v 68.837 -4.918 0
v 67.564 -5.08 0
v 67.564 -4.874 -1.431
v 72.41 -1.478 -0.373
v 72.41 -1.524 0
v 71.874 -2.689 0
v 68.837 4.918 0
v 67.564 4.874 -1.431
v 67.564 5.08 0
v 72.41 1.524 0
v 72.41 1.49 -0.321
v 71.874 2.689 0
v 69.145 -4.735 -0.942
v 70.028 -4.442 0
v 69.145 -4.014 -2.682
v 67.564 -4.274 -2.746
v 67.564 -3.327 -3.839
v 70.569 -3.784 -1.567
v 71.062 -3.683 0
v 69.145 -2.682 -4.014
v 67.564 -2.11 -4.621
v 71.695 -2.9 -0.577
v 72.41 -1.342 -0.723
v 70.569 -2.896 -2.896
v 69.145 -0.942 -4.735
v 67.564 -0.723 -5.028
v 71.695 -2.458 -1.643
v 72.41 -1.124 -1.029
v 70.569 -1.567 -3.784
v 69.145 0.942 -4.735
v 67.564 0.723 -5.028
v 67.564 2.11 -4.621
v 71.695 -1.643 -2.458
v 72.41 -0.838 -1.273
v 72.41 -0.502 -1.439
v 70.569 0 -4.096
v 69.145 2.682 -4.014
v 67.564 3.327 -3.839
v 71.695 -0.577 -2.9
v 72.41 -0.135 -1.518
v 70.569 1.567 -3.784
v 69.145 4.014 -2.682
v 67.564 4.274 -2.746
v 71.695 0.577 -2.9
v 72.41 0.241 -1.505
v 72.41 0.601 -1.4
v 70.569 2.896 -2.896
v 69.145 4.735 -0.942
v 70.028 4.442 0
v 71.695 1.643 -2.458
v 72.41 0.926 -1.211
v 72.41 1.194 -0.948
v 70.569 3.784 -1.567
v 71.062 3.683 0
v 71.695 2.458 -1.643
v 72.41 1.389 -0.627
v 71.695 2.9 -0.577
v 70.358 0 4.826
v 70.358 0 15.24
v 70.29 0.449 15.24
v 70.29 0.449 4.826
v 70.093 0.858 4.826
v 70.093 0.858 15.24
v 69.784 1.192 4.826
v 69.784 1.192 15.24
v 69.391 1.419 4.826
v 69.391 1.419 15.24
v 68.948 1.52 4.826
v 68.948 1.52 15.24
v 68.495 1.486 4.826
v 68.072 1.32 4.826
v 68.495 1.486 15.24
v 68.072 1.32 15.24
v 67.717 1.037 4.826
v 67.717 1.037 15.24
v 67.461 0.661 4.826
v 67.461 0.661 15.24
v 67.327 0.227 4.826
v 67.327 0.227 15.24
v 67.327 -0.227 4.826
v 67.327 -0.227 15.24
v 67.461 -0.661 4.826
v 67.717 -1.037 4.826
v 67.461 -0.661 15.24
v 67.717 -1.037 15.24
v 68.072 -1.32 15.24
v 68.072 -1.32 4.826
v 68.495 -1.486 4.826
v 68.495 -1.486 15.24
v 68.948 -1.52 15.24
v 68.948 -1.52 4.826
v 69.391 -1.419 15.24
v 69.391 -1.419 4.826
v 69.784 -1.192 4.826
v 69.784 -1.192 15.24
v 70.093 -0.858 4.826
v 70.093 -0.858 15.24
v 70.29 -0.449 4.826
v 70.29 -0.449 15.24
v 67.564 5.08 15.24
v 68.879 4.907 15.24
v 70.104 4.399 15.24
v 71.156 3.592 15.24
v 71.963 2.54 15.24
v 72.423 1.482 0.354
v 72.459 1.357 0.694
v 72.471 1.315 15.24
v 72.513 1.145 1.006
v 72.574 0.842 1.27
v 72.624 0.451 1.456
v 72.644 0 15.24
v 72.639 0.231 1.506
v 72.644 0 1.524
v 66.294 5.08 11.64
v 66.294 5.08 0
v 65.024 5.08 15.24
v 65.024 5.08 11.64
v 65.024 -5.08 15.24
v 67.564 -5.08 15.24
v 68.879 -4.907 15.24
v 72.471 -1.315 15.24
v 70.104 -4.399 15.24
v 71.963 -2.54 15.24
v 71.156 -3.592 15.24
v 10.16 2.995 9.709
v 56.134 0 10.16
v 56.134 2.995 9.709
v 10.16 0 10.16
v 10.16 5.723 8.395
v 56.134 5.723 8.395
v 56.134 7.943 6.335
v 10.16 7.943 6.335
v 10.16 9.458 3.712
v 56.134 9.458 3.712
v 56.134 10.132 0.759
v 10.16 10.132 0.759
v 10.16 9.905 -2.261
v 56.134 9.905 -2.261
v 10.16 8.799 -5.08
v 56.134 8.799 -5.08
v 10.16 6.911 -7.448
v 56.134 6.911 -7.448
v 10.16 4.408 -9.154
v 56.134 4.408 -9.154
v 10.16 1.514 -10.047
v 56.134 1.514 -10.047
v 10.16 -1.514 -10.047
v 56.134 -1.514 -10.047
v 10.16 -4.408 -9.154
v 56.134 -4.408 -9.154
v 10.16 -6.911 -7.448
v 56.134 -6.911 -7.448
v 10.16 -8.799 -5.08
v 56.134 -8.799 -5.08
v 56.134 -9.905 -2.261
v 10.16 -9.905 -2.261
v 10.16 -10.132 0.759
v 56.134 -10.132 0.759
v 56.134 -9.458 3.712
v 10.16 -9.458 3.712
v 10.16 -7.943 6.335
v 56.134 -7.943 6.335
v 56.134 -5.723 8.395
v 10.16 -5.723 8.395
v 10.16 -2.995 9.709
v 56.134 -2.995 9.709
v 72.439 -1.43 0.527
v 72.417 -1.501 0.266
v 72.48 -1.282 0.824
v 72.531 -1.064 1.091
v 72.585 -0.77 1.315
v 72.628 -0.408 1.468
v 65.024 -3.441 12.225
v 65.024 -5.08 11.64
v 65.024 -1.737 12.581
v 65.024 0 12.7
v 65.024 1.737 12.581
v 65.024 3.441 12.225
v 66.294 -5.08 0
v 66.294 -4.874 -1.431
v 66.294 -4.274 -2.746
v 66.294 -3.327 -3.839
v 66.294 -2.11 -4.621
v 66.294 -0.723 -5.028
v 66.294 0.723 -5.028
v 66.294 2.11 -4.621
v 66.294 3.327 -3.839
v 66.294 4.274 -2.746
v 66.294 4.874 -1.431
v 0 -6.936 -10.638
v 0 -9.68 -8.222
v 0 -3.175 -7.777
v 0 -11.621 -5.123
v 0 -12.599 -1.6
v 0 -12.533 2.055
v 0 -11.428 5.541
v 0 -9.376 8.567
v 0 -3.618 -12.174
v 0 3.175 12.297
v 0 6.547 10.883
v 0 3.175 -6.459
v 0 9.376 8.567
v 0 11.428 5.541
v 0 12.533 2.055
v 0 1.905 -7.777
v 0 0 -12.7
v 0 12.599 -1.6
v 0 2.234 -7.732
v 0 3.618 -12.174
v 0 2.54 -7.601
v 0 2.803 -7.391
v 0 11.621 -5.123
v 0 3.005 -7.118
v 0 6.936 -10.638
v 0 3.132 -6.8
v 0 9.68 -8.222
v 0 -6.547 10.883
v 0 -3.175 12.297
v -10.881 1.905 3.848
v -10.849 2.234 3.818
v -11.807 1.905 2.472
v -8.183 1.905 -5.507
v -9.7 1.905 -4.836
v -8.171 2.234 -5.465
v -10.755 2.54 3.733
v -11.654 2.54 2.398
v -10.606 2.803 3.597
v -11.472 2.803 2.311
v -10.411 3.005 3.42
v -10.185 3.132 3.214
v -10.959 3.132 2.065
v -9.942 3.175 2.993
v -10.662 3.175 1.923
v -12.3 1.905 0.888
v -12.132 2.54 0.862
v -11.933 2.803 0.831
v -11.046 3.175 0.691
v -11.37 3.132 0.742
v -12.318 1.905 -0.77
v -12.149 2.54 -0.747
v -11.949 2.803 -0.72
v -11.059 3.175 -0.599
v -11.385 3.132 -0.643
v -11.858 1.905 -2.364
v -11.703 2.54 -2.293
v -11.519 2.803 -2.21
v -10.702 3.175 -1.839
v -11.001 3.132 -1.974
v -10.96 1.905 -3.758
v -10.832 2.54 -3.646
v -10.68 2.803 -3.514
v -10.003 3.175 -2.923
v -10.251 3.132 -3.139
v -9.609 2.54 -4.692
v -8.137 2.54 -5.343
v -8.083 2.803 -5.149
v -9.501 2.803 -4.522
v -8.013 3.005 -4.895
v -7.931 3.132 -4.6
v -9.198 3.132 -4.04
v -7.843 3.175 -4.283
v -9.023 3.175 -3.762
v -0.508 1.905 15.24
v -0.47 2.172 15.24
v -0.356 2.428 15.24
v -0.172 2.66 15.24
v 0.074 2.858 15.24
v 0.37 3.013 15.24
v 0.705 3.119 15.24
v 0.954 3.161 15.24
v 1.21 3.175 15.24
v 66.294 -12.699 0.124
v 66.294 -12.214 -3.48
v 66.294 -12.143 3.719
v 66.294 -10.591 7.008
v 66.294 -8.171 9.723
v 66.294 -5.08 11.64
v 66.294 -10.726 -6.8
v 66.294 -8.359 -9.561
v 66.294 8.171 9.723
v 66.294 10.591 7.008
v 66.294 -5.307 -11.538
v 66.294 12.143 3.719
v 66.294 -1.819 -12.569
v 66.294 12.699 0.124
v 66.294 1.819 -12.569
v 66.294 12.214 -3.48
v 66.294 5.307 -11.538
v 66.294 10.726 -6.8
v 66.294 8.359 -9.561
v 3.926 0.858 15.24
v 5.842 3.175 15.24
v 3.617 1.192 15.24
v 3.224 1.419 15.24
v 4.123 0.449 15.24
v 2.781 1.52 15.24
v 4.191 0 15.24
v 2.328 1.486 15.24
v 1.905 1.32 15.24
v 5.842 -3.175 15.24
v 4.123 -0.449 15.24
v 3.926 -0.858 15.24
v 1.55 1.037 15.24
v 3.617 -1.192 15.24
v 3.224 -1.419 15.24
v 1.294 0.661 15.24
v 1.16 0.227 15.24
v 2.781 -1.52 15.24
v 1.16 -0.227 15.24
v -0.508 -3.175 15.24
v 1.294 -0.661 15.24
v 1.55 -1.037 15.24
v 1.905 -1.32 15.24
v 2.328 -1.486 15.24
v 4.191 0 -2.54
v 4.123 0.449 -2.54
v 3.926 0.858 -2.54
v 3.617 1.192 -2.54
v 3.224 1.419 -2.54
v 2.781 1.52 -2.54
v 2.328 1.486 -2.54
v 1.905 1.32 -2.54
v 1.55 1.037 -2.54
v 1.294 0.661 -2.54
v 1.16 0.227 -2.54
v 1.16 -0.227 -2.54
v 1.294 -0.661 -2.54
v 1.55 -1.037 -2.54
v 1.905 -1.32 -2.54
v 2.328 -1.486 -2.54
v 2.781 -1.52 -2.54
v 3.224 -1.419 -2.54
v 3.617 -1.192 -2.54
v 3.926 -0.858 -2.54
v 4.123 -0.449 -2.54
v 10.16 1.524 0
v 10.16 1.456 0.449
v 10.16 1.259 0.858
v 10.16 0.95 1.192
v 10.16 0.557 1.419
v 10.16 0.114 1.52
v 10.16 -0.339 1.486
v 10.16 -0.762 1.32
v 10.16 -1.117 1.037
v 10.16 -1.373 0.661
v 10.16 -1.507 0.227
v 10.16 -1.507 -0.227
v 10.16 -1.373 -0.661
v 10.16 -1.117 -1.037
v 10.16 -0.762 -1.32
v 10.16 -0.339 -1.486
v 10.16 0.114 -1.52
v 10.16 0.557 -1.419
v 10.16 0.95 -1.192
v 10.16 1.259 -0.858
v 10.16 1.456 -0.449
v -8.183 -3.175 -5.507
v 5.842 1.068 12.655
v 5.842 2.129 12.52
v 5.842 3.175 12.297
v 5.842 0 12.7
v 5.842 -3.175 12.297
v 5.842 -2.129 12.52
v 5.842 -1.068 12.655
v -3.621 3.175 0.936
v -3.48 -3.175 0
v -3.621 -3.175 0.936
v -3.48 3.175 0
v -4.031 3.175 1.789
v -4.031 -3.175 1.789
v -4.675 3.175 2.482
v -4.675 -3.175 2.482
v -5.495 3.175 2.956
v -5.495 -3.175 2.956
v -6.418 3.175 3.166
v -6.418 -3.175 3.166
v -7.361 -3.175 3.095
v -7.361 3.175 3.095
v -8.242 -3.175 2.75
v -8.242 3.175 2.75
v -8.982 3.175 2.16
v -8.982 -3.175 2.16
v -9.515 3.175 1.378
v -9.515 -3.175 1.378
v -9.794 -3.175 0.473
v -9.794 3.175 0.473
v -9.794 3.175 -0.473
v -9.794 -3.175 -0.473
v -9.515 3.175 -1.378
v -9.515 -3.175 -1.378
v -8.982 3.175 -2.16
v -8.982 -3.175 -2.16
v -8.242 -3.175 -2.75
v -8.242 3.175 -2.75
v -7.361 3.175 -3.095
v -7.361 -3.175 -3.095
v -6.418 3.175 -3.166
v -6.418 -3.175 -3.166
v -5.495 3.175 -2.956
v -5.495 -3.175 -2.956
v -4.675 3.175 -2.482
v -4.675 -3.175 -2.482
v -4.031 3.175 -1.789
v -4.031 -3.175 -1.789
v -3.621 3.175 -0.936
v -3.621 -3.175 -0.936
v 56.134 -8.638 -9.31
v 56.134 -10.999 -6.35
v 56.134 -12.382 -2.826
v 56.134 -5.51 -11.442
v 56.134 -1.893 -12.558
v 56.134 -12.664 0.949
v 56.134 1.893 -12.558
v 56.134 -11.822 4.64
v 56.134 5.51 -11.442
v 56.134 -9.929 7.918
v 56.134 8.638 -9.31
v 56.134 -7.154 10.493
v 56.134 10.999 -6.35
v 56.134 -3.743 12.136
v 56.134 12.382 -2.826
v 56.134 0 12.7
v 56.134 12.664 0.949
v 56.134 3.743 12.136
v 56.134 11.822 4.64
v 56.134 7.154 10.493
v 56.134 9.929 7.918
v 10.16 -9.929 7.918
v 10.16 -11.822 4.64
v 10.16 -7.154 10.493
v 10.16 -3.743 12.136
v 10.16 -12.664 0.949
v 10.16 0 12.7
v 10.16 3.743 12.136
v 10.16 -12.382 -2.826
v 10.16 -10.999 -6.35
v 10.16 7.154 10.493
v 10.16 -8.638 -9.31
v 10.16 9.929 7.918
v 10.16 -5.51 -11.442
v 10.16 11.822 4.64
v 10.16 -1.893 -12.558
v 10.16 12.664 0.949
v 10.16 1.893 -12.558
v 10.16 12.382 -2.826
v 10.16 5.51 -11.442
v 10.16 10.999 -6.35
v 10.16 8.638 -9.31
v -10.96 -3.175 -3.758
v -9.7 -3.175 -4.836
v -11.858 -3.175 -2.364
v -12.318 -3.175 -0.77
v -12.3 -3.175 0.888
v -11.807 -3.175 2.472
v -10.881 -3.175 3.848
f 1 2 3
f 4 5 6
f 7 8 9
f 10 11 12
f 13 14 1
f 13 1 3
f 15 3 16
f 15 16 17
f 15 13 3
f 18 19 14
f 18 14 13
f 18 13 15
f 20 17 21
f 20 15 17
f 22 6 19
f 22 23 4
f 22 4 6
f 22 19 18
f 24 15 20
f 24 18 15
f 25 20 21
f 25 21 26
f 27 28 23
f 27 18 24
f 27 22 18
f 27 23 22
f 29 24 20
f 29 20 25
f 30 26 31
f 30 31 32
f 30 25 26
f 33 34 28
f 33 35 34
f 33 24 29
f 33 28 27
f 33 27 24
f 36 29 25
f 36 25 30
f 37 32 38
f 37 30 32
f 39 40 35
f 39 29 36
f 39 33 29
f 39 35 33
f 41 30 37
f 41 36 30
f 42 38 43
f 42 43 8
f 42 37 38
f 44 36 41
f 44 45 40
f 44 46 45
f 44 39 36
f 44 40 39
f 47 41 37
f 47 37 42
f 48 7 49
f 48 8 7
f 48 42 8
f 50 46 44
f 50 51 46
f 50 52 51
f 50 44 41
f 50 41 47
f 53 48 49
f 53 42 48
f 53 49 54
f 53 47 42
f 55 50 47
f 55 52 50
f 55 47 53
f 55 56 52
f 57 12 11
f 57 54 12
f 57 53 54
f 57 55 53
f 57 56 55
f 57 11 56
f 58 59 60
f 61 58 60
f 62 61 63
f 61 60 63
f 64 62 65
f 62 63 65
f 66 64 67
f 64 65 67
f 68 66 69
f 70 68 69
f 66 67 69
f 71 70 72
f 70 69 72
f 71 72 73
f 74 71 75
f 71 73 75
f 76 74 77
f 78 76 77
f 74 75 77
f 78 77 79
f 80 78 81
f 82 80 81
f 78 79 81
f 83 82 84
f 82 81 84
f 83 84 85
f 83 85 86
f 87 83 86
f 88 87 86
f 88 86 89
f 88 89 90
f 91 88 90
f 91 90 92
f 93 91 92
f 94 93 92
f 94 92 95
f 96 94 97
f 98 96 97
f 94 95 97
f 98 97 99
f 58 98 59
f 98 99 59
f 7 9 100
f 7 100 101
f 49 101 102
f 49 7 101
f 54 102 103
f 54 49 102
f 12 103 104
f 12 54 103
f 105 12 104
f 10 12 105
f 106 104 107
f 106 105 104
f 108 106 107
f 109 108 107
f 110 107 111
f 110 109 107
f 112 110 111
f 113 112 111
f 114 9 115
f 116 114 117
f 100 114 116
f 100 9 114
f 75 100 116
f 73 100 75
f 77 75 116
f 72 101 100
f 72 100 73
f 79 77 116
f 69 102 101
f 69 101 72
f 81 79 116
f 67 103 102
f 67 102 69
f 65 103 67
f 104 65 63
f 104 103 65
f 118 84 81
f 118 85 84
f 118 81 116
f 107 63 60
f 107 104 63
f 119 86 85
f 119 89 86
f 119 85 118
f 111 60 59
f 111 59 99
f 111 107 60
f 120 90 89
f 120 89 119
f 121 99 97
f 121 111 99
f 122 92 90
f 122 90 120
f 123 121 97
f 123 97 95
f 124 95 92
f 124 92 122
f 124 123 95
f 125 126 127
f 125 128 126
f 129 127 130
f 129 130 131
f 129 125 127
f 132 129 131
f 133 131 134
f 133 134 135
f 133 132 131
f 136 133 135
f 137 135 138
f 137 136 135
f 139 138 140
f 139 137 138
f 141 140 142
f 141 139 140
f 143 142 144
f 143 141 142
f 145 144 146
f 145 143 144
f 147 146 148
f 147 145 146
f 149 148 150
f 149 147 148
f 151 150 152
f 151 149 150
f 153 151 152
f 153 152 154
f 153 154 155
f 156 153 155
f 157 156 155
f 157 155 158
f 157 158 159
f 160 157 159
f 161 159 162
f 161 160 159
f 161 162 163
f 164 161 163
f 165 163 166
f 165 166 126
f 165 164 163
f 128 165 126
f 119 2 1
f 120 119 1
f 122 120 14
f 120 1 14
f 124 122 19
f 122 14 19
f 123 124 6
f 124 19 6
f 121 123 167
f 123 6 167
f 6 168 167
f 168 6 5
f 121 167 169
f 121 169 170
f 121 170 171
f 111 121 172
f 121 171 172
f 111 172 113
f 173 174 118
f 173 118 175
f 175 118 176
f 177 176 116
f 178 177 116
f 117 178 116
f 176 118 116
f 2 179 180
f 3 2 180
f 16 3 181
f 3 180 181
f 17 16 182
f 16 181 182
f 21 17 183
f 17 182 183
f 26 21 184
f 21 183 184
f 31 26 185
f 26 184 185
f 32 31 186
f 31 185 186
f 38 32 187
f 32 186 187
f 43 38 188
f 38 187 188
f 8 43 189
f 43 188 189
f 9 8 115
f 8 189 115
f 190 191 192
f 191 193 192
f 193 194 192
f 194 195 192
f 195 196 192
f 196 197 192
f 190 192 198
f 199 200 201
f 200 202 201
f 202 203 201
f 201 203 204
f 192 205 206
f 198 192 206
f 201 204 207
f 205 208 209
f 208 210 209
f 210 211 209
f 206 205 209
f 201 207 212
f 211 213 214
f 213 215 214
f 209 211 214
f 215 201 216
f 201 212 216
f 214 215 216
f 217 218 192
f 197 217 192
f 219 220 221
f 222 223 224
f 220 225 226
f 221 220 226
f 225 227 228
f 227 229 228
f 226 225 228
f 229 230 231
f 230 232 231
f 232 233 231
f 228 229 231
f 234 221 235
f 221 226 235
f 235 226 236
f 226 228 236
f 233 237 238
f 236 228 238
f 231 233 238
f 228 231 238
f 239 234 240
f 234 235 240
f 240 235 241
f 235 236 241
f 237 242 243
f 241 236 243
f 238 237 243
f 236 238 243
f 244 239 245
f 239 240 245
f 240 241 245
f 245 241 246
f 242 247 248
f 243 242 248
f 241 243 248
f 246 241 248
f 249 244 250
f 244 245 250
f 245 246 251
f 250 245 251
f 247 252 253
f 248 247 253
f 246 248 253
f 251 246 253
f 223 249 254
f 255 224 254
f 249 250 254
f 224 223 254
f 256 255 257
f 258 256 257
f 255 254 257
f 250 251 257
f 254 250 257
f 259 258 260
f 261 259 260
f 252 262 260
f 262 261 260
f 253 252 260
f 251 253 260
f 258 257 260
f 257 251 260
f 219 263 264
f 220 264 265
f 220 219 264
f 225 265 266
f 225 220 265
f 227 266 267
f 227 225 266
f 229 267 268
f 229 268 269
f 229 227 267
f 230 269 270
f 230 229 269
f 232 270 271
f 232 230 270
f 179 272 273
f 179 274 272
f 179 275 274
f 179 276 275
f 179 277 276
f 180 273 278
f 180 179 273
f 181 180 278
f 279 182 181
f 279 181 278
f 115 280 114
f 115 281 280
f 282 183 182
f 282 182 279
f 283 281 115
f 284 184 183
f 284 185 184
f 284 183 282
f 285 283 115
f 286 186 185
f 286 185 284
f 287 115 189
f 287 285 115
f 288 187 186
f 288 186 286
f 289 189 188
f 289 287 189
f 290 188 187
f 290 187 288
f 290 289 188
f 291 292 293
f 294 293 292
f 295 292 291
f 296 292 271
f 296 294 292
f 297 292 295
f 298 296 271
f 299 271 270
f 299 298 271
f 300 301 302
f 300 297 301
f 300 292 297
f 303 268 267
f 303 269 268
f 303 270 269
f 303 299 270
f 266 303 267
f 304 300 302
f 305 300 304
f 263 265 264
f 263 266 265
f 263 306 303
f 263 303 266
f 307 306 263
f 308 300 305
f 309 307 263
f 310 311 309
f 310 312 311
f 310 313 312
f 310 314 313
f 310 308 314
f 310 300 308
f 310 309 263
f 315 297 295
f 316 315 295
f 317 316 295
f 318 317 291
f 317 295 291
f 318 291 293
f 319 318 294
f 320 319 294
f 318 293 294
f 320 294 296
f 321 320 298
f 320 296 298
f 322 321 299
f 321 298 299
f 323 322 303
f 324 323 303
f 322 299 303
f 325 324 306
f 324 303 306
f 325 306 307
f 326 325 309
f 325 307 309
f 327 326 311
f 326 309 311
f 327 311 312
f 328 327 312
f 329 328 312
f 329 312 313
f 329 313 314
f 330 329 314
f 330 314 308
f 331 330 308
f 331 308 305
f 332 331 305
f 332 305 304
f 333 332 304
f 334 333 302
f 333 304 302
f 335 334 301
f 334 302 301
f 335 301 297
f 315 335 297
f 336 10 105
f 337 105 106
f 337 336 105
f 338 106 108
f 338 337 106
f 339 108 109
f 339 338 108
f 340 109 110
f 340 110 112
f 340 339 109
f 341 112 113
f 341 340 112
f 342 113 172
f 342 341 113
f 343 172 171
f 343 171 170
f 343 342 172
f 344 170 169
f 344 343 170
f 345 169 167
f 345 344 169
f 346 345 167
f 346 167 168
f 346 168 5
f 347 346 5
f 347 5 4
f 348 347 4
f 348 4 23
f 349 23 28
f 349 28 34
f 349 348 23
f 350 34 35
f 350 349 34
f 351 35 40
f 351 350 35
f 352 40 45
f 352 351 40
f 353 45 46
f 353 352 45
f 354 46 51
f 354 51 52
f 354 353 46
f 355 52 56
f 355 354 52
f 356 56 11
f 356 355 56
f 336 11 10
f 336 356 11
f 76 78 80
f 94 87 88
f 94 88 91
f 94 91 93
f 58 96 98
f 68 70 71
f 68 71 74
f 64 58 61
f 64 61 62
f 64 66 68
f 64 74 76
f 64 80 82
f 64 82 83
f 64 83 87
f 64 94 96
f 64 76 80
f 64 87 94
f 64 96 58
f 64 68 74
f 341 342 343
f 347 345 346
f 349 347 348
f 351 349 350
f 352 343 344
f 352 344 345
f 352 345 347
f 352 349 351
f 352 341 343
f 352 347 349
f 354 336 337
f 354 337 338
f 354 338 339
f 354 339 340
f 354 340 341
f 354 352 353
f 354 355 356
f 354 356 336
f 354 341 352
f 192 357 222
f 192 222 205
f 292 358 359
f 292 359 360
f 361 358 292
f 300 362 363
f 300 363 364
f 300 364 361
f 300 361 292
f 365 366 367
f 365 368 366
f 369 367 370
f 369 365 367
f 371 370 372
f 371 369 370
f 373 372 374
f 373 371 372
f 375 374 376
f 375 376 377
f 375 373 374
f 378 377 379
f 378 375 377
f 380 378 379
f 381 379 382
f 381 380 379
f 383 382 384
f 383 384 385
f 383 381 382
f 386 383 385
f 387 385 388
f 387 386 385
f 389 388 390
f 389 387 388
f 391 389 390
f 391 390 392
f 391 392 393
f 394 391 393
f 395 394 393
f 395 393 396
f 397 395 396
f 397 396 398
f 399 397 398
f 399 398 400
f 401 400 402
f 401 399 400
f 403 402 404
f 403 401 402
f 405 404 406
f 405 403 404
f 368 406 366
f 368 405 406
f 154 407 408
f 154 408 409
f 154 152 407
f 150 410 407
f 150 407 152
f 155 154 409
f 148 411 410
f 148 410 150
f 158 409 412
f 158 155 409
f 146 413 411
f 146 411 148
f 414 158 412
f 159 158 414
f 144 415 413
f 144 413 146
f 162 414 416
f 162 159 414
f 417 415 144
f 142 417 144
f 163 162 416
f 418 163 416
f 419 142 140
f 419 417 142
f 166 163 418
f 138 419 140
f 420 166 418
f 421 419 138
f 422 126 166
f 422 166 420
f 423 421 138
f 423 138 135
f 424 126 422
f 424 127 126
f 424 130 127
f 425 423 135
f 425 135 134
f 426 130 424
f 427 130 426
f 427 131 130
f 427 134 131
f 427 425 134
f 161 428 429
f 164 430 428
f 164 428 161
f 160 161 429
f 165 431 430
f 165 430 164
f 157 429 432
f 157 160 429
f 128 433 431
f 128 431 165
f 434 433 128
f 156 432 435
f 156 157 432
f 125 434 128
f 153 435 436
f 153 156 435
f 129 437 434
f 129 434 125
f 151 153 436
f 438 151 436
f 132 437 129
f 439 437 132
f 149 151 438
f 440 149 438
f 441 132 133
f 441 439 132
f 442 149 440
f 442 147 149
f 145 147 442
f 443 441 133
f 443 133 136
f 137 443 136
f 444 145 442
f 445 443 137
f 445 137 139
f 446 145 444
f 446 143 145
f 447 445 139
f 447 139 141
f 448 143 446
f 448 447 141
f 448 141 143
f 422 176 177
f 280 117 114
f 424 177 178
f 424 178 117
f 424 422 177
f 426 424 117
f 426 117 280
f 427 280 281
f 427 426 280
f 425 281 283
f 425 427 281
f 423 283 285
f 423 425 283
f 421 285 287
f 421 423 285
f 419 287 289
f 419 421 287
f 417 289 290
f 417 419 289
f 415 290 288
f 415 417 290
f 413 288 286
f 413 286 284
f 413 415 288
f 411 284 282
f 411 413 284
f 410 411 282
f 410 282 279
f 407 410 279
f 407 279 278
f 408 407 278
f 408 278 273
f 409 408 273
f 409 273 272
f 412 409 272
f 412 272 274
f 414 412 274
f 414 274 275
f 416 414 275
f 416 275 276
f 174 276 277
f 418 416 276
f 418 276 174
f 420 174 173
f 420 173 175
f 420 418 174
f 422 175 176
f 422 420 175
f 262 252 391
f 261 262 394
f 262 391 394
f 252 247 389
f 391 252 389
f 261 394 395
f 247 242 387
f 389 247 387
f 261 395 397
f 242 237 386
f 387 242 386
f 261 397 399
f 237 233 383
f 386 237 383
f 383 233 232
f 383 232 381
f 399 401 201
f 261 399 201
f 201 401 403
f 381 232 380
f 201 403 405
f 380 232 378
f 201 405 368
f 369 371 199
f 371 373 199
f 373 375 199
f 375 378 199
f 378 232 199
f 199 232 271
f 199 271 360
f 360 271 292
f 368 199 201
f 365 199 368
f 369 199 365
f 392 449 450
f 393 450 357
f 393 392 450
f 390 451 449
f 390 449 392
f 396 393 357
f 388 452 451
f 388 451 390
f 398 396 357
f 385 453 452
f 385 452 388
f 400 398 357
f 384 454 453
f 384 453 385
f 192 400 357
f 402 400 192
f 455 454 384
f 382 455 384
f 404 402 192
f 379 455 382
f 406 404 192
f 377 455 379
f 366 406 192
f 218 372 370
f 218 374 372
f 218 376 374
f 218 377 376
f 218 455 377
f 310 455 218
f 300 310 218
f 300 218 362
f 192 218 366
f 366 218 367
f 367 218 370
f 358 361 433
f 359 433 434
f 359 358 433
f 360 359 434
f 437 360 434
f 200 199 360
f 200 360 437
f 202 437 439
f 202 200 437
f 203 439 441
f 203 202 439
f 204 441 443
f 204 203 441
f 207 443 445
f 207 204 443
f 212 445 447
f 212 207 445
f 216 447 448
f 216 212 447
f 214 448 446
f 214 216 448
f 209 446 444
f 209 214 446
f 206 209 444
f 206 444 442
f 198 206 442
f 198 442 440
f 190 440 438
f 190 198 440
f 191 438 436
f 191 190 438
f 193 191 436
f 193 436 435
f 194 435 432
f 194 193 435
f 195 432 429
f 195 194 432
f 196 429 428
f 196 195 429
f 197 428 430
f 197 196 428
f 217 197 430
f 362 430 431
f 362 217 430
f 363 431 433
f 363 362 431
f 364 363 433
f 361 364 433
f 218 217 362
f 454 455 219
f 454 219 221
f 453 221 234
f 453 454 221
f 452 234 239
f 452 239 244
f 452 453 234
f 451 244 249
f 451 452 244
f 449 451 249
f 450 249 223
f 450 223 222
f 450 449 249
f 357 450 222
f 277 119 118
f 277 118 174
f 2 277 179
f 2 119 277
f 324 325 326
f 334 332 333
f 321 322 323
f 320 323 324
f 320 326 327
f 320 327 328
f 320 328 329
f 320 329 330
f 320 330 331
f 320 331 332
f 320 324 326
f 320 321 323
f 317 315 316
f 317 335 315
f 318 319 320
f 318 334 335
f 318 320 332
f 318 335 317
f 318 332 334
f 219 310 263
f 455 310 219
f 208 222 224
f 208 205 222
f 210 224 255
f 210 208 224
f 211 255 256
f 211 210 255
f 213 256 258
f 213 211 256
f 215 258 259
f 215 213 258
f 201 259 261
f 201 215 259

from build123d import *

# Parameters (mm, degrees)
F0_W          = 5.842
F0_H          = 12.7
F0_R          = 3.175
F2_DEPTH      = 3.175
F3_R          = 1.524
F4_DEPTH      = 6.35
F4_DEPTH_BACK = 1.27
F5_R          = 1.524
F6_DEPTH      = 10.414
F7_R          = 1.524
F8_DEPTH      = 17.78
F9_DEPTH      = 56.134
F10_R         = 1.27
F11_T1_DEPTH  = 27.94
F11_T4_ANGLE  = 180


# Not quite as in the source:
# - a fillet or chamfer that OpenCascade refuses, or shapes differently, is made with other operations: its cross-section is extruded or revolved along the edge and cut away or added


with BuildPart() as f1:
    # F0 (on Front) → F1 (revolve)
    with BuildSketch(Plane.XZ):
        Polygon((5.842, 12.7), (5.842, 0), (66.294, 0), (66.294, 12.7), (56.134, 12.7), (56.134, 10.16), (10.16, 10.16), (10.16, 12.7), align=None)
        with Locations((2.921, 6.35)):
            Rectangle(F0_W, F0_H)
    revolve(axis=Axis((33.147, 0, 0), (-1, 0, 0)))

    # F0 (on Front) → F2 (join, symmetric)
    with BuildSketch(Plane.XZ):
        with BuildLine():
            Line((-0.9398, 0), (0, 0))
            Line((0, 0), (0, 12.7))
            Line((0, 12.7), (5.842, 12.7))
            Line((5.842, 12.7), (5.842, 15.24))
            Line((5.842, 15.24), (-0.508, 15.24))
            Line((-0.508, 15.24), (-10.8806298187, 3.8475430269))
            ThreePointArc((-10.8806298187, 3.8475430269), (-4.5919612295, 5.3297205562), (-0.9398, 0))
        make_face()
        with Locations((2.921, 6.35)):
            Rectangle(F0_W, F0_H)
        with BuildLine():
            Line((5.842, 0), (0, 0))
            Line((0, 0), (-0.9398, 0))
            ThreePointArc((-0.9398, 0), (-3.1957909266, -4.5493385486), (-8.1826630726, -5.5069827884))
            Line((-8.1826630726, -5.5069827884), (5.842, -9.398))
            Line((5.842, -9.398), (5.842, 0))
        make_face()
        with BuildLine():
            ThreePointArc((-8.1826630726, -5.5069827884), (-3.1957909266, -4.5493385486), (-0.9398, 0))
            ThreePointArc((-0.9398, 0), (-4.5919612295, 5.3297205562), (-10.8806298187, 3.8475430269))
            ThreePointArc((-10.8806298187, 3.8475430269), (-12.1459778134, -1.5837270034), (-8.1826630726, -5.5069827884))
        make_face()
        with Locations((-6.6548, 0)):
            Circle(F0_R, mode=Mode.SUBTRACT)
    extrude(amount=F2_DEPTH, both=True)

    # F3 (on face) → F4 (join, two sides)
    with BuildSketch(Plane.YZ.offset(66.294)) as f4_sk:
        with BuildLine():
            ThreePointArc((-5.08, 0), (0, -5.08), (5.08, 0))
            ThreePointArc((5.08, 0), (0, 5.08), (-5.08, 0))
        make_face()
        Circle(F3_R, mode=Mode.SUBTRACT)
        with BuildLine():
            ThreePointArc((-5.08, 0), (0, 5.08), (5.08, 0))
            Line((5.08, 0), (5.08, 15.24))
            Line((5.08, 15.24), (-5.08, 15.24))
            Line((-5.08, 15.24), (-5.08, 0))
        make_face()
    extrude(amount=F4_DEPTH)
    extrude(f4_sk.sketch, amount=-F4_DEPTH_BACK)

    # F5 (on face) → F6 (cut)
    with BuildSketch(Plane.XY.offset(15.24)):
        with Locations((68.834, 0)):
            Circle(F5_R)
    extrude(amount=-F6_DEPTH, mode=Mode.SUBTRACT)

    # F7 (on face) → F8 (cut)
    with BuildSketch(Plane.XY.offset(15.24)):
        with Locations((2.667, 0)):
            Circle(F7_R)
    extrude(amount=-F8_DEPTH, mode=Mode.SUBTRACT)

    # F9 (cut, through all): a face of the model
    f9_faces = [f1.faces().sort_by_distance(p)[0] for p in [
        (66.294, 0, 0),
    ]]
    extrude(f9_faces, amount=-F9_DEPTH, mode=Mode.SUBTRACT)

    # F10
    f10_edges = [f1.edges().sort_by_distance(p)[0] for p in [
        (-12.145978, 3.175, -1.583727),
        (-5.694315, 3.175, 9.543772),
    ]]
    fillet(f10_edges, radius=F10_R)

    # F11: fillet of radius 5.08 on 2 edges, made by hand

    # F11_s2 → F11_t1 (cut)
    with BuildSketch(Plane.XY):
        with BuildLine():
            ThreePointArc((67.564, -5.08), (71.1561024484, -3.5921024484), (72.644, 0))
            Line((72.644, 0), (72.644, -5.08))
            Line((72.644, -5.08), (67.564, -5.08))
        make_face()
        with BuildLine():
            ThreePointArc((67.564, 5.08), (71.1561024484, 3.5921024484), (72.644, 0))
            Line((72.644, 0), (72.644, 5.08))
            Line((72.644, 5.08), (67.564, 5.08))
        make_face()
    extrude(amount=F11_T1_DEPTH, mode=Mode.SUBTRACT)

    # F11_s3 → F11_t4 (revolve, cut)
    with BuildSketch(Plane.XY):
        with BuildLine():
            ThreePointArc((67.564, -5.08), (71.1561024484, -3.5921024484), (72.644, 0))
            Line((72.644, 0), (72.644, -5.08))
            Line((72.644, -5.08), (67.564, -5.08))
        make_face()
    revolve(axis=Axis((72.644, 0, 0), (1, 0, 0)), revolution_arc=F11_T4_ANGLE, mode=Mode.SUBTRACT)


solid = f1.part
